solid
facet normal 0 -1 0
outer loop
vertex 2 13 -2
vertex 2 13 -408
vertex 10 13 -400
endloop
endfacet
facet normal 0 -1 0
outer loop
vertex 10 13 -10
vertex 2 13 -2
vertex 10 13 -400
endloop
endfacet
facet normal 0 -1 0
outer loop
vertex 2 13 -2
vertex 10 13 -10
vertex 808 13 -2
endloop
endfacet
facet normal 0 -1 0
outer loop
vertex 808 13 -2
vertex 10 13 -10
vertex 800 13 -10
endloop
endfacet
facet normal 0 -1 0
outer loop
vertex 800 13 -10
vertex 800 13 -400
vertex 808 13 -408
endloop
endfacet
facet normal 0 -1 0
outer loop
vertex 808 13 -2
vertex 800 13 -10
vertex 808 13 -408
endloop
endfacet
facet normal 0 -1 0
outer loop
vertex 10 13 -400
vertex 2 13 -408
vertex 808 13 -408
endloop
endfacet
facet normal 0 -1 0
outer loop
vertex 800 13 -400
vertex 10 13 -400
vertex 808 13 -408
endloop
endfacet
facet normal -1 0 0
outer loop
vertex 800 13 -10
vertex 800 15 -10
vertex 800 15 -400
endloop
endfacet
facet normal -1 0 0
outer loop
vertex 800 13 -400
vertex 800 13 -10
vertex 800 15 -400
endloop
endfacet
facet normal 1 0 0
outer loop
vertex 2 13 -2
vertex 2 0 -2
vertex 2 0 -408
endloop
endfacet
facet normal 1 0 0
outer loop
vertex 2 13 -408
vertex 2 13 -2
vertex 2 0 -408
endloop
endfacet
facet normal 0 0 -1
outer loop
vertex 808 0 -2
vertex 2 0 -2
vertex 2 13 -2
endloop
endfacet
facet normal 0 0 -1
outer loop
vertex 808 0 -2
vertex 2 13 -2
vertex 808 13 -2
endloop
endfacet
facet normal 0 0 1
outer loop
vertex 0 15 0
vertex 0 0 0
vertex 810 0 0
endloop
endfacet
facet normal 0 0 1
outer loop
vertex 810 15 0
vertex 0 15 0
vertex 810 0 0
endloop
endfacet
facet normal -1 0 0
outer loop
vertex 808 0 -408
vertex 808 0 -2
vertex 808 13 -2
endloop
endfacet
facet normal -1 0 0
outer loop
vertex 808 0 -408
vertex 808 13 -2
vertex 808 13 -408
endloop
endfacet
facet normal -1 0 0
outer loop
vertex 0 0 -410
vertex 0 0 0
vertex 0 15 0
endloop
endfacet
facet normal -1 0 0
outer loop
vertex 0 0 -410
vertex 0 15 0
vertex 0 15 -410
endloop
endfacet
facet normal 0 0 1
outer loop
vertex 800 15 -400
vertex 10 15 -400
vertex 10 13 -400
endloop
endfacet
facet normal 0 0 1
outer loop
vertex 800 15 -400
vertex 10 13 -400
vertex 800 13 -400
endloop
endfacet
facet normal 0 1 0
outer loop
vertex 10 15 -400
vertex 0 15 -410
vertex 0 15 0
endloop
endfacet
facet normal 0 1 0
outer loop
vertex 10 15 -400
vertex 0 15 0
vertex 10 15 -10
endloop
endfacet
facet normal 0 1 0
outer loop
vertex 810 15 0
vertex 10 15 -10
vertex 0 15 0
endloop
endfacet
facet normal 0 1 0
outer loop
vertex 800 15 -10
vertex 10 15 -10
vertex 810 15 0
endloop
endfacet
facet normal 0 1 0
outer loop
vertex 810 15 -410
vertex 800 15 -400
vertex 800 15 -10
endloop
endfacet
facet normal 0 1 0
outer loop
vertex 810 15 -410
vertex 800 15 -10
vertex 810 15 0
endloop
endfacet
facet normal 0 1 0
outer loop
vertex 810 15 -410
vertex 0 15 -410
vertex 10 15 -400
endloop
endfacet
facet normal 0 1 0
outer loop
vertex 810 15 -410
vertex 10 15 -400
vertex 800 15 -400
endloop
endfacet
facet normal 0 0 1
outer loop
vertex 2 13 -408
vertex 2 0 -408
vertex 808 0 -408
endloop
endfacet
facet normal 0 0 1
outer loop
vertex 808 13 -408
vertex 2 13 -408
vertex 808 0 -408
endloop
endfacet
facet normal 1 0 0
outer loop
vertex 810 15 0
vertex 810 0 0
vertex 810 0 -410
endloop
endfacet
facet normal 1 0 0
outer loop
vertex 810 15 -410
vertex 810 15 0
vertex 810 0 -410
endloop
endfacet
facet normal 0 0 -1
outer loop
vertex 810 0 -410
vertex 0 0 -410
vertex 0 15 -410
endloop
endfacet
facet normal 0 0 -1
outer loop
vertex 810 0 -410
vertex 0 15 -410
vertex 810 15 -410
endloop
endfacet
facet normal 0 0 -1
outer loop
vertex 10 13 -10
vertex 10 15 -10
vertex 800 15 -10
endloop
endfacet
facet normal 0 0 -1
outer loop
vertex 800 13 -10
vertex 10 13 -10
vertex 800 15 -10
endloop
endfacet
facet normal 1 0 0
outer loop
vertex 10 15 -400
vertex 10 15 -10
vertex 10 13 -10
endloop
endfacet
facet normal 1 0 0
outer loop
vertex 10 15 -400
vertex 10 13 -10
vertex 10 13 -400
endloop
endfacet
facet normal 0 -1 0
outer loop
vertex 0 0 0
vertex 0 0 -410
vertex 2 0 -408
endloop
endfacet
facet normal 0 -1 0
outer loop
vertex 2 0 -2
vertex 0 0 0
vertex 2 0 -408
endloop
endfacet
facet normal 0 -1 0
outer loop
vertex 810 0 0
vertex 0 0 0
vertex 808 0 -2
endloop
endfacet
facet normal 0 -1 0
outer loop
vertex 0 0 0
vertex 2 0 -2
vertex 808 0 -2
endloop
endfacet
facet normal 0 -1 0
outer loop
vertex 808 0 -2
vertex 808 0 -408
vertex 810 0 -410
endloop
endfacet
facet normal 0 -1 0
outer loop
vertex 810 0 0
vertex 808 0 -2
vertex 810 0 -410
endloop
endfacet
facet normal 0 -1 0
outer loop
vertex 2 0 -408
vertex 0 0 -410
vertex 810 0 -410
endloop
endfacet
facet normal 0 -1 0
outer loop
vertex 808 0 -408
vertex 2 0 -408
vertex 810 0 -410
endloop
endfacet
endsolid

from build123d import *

# Parameters (mm, degrees)
SKETCH1_W           = 810
SKETCH1_H           = 410
BOSS_EXTRUDE1_DEPTH = 15
SHELL1_T            = -2
SKETCH2_W           = 790
SKETCH2_H           = 390
CUT_EXTRUDE1_DEPTH  = 15


with BuildPart() as part:
    # Sketch1 → Boss-Extrude1 (new body)
    with BuildSketch(Plane(origin=(0, 0, 0), x_dir=(1, 0, 0), z_dir=(0, 1, 0))):
        with Locations((405, 205)):
            Rectangle(SKETCH1_W, SKETCH1_H)
    extrude(amount=BOSS_EXTRUDE1_DEPTH)

    # Shell1
    shell1_openings = [part.faces().sort_by_distance(p)[0] for p in [
        (405, 0, -205),
    ]]
    offset(amount=SHELL1_T, openings=shell1_openings, kind=Kind.INTERSECTION)

    # Sketch2 → Cut-Extrude1 (cut)
    with BuildSketch(Plane(origin=(0, 15, 0), x_dir=(1, 0, 0), z_dir=(0, 1, 0))):
        with Locations((405, 205)):
            Rectangle(SKETCH2_W, SKETCH2_H)
    extrude(amount=-CUT_EXTRUDE1_DEPTH, mode=Mode.SUBTRACT)


solid = part.part
